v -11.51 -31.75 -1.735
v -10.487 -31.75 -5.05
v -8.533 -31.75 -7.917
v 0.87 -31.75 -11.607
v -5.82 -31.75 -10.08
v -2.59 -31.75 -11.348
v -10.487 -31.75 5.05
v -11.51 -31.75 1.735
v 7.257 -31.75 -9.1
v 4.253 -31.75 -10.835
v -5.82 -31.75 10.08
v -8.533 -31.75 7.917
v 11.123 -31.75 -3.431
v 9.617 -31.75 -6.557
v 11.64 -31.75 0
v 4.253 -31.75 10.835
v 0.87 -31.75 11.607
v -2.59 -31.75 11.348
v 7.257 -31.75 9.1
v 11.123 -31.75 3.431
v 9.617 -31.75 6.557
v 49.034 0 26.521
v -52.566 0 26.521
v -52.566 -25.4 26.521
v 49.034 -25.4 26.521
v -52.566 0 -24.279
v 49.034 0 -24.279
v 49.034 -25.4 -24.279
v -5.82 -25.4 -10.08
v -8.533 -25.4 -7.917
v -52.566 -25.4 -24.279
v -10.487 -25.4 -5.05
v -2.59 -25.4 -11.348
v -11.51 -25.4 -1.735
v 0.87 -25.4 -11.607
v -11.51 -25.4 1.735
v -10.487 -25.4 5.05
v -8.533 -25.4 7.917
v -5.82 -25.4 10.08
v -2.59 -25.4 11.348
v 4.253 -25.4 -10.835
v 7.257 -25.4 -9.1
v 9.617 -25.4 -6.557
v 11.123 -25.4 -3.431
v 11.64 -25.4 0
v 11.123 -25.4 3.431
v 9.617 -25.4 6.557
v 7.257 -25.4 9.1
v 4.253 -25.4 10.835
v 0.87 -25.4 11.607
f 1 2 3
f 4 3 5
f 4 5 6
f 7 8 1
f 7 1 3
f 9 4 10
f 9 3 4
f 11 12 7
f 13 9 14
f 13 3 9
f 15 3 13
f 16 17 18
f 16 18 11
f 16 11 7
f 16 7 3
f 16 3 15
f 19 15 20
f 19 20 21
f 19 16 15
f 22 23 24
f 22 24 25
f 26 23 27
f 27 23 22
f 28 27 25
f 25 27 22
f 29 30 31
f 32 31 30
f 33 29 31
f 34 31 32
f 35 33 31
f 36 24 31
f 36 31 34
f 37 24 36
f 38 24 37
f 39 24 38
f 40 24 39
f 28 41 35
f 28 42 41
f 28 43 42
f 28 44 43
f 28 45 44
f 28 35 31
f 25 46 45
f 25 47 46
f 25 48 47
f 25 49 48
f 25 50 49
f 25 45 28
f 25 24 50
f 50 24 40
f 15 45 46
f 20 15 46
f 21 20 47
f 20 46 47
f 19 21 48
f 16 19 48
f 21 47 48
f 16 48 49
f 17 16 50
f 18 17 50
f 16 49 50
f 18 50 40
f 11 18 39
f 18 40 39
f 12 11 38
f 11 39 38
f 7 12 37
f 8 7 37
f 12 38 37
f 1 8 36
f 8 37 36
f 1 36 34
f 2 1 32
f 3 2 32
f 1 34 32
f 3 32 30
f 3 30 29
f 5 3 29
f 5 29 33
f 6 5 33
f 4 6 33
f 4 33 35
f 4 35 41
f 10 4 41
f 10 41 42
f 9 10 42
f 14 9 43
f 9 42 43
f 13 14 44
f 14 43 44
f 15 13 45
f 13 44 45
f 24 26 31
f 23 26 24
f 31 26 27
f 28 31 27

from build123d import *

# Parameters (mm, degrees)
F0_W     = 101.6
F0_H     = 50.8
F1_DEPTH = 25.4
F2_R     = 11.6399110946
F3_DEPTH = 6.35


# Not quite as in the source:
# - a feature of the source that left no trace in its solid (it failed there, or was rolled back) is left out


with BuildPart() as f1:
    # F0 (on Front) → F1 (new body)
    with BuildSketch(Plane.XZ):
        with Locations((-1.7657391727, 1.1206692427)):
            Rectangle(F0_W, F0_H)
    extrude(amount=F1_DEPTH)

    # F2 (on face) → F3 (join)
    with BuildSketch(Plane.XZ.offset(25.4)):
        Circle(F2_R)
    extrude(amount=F3_DEPTH)


solid = f1.part
